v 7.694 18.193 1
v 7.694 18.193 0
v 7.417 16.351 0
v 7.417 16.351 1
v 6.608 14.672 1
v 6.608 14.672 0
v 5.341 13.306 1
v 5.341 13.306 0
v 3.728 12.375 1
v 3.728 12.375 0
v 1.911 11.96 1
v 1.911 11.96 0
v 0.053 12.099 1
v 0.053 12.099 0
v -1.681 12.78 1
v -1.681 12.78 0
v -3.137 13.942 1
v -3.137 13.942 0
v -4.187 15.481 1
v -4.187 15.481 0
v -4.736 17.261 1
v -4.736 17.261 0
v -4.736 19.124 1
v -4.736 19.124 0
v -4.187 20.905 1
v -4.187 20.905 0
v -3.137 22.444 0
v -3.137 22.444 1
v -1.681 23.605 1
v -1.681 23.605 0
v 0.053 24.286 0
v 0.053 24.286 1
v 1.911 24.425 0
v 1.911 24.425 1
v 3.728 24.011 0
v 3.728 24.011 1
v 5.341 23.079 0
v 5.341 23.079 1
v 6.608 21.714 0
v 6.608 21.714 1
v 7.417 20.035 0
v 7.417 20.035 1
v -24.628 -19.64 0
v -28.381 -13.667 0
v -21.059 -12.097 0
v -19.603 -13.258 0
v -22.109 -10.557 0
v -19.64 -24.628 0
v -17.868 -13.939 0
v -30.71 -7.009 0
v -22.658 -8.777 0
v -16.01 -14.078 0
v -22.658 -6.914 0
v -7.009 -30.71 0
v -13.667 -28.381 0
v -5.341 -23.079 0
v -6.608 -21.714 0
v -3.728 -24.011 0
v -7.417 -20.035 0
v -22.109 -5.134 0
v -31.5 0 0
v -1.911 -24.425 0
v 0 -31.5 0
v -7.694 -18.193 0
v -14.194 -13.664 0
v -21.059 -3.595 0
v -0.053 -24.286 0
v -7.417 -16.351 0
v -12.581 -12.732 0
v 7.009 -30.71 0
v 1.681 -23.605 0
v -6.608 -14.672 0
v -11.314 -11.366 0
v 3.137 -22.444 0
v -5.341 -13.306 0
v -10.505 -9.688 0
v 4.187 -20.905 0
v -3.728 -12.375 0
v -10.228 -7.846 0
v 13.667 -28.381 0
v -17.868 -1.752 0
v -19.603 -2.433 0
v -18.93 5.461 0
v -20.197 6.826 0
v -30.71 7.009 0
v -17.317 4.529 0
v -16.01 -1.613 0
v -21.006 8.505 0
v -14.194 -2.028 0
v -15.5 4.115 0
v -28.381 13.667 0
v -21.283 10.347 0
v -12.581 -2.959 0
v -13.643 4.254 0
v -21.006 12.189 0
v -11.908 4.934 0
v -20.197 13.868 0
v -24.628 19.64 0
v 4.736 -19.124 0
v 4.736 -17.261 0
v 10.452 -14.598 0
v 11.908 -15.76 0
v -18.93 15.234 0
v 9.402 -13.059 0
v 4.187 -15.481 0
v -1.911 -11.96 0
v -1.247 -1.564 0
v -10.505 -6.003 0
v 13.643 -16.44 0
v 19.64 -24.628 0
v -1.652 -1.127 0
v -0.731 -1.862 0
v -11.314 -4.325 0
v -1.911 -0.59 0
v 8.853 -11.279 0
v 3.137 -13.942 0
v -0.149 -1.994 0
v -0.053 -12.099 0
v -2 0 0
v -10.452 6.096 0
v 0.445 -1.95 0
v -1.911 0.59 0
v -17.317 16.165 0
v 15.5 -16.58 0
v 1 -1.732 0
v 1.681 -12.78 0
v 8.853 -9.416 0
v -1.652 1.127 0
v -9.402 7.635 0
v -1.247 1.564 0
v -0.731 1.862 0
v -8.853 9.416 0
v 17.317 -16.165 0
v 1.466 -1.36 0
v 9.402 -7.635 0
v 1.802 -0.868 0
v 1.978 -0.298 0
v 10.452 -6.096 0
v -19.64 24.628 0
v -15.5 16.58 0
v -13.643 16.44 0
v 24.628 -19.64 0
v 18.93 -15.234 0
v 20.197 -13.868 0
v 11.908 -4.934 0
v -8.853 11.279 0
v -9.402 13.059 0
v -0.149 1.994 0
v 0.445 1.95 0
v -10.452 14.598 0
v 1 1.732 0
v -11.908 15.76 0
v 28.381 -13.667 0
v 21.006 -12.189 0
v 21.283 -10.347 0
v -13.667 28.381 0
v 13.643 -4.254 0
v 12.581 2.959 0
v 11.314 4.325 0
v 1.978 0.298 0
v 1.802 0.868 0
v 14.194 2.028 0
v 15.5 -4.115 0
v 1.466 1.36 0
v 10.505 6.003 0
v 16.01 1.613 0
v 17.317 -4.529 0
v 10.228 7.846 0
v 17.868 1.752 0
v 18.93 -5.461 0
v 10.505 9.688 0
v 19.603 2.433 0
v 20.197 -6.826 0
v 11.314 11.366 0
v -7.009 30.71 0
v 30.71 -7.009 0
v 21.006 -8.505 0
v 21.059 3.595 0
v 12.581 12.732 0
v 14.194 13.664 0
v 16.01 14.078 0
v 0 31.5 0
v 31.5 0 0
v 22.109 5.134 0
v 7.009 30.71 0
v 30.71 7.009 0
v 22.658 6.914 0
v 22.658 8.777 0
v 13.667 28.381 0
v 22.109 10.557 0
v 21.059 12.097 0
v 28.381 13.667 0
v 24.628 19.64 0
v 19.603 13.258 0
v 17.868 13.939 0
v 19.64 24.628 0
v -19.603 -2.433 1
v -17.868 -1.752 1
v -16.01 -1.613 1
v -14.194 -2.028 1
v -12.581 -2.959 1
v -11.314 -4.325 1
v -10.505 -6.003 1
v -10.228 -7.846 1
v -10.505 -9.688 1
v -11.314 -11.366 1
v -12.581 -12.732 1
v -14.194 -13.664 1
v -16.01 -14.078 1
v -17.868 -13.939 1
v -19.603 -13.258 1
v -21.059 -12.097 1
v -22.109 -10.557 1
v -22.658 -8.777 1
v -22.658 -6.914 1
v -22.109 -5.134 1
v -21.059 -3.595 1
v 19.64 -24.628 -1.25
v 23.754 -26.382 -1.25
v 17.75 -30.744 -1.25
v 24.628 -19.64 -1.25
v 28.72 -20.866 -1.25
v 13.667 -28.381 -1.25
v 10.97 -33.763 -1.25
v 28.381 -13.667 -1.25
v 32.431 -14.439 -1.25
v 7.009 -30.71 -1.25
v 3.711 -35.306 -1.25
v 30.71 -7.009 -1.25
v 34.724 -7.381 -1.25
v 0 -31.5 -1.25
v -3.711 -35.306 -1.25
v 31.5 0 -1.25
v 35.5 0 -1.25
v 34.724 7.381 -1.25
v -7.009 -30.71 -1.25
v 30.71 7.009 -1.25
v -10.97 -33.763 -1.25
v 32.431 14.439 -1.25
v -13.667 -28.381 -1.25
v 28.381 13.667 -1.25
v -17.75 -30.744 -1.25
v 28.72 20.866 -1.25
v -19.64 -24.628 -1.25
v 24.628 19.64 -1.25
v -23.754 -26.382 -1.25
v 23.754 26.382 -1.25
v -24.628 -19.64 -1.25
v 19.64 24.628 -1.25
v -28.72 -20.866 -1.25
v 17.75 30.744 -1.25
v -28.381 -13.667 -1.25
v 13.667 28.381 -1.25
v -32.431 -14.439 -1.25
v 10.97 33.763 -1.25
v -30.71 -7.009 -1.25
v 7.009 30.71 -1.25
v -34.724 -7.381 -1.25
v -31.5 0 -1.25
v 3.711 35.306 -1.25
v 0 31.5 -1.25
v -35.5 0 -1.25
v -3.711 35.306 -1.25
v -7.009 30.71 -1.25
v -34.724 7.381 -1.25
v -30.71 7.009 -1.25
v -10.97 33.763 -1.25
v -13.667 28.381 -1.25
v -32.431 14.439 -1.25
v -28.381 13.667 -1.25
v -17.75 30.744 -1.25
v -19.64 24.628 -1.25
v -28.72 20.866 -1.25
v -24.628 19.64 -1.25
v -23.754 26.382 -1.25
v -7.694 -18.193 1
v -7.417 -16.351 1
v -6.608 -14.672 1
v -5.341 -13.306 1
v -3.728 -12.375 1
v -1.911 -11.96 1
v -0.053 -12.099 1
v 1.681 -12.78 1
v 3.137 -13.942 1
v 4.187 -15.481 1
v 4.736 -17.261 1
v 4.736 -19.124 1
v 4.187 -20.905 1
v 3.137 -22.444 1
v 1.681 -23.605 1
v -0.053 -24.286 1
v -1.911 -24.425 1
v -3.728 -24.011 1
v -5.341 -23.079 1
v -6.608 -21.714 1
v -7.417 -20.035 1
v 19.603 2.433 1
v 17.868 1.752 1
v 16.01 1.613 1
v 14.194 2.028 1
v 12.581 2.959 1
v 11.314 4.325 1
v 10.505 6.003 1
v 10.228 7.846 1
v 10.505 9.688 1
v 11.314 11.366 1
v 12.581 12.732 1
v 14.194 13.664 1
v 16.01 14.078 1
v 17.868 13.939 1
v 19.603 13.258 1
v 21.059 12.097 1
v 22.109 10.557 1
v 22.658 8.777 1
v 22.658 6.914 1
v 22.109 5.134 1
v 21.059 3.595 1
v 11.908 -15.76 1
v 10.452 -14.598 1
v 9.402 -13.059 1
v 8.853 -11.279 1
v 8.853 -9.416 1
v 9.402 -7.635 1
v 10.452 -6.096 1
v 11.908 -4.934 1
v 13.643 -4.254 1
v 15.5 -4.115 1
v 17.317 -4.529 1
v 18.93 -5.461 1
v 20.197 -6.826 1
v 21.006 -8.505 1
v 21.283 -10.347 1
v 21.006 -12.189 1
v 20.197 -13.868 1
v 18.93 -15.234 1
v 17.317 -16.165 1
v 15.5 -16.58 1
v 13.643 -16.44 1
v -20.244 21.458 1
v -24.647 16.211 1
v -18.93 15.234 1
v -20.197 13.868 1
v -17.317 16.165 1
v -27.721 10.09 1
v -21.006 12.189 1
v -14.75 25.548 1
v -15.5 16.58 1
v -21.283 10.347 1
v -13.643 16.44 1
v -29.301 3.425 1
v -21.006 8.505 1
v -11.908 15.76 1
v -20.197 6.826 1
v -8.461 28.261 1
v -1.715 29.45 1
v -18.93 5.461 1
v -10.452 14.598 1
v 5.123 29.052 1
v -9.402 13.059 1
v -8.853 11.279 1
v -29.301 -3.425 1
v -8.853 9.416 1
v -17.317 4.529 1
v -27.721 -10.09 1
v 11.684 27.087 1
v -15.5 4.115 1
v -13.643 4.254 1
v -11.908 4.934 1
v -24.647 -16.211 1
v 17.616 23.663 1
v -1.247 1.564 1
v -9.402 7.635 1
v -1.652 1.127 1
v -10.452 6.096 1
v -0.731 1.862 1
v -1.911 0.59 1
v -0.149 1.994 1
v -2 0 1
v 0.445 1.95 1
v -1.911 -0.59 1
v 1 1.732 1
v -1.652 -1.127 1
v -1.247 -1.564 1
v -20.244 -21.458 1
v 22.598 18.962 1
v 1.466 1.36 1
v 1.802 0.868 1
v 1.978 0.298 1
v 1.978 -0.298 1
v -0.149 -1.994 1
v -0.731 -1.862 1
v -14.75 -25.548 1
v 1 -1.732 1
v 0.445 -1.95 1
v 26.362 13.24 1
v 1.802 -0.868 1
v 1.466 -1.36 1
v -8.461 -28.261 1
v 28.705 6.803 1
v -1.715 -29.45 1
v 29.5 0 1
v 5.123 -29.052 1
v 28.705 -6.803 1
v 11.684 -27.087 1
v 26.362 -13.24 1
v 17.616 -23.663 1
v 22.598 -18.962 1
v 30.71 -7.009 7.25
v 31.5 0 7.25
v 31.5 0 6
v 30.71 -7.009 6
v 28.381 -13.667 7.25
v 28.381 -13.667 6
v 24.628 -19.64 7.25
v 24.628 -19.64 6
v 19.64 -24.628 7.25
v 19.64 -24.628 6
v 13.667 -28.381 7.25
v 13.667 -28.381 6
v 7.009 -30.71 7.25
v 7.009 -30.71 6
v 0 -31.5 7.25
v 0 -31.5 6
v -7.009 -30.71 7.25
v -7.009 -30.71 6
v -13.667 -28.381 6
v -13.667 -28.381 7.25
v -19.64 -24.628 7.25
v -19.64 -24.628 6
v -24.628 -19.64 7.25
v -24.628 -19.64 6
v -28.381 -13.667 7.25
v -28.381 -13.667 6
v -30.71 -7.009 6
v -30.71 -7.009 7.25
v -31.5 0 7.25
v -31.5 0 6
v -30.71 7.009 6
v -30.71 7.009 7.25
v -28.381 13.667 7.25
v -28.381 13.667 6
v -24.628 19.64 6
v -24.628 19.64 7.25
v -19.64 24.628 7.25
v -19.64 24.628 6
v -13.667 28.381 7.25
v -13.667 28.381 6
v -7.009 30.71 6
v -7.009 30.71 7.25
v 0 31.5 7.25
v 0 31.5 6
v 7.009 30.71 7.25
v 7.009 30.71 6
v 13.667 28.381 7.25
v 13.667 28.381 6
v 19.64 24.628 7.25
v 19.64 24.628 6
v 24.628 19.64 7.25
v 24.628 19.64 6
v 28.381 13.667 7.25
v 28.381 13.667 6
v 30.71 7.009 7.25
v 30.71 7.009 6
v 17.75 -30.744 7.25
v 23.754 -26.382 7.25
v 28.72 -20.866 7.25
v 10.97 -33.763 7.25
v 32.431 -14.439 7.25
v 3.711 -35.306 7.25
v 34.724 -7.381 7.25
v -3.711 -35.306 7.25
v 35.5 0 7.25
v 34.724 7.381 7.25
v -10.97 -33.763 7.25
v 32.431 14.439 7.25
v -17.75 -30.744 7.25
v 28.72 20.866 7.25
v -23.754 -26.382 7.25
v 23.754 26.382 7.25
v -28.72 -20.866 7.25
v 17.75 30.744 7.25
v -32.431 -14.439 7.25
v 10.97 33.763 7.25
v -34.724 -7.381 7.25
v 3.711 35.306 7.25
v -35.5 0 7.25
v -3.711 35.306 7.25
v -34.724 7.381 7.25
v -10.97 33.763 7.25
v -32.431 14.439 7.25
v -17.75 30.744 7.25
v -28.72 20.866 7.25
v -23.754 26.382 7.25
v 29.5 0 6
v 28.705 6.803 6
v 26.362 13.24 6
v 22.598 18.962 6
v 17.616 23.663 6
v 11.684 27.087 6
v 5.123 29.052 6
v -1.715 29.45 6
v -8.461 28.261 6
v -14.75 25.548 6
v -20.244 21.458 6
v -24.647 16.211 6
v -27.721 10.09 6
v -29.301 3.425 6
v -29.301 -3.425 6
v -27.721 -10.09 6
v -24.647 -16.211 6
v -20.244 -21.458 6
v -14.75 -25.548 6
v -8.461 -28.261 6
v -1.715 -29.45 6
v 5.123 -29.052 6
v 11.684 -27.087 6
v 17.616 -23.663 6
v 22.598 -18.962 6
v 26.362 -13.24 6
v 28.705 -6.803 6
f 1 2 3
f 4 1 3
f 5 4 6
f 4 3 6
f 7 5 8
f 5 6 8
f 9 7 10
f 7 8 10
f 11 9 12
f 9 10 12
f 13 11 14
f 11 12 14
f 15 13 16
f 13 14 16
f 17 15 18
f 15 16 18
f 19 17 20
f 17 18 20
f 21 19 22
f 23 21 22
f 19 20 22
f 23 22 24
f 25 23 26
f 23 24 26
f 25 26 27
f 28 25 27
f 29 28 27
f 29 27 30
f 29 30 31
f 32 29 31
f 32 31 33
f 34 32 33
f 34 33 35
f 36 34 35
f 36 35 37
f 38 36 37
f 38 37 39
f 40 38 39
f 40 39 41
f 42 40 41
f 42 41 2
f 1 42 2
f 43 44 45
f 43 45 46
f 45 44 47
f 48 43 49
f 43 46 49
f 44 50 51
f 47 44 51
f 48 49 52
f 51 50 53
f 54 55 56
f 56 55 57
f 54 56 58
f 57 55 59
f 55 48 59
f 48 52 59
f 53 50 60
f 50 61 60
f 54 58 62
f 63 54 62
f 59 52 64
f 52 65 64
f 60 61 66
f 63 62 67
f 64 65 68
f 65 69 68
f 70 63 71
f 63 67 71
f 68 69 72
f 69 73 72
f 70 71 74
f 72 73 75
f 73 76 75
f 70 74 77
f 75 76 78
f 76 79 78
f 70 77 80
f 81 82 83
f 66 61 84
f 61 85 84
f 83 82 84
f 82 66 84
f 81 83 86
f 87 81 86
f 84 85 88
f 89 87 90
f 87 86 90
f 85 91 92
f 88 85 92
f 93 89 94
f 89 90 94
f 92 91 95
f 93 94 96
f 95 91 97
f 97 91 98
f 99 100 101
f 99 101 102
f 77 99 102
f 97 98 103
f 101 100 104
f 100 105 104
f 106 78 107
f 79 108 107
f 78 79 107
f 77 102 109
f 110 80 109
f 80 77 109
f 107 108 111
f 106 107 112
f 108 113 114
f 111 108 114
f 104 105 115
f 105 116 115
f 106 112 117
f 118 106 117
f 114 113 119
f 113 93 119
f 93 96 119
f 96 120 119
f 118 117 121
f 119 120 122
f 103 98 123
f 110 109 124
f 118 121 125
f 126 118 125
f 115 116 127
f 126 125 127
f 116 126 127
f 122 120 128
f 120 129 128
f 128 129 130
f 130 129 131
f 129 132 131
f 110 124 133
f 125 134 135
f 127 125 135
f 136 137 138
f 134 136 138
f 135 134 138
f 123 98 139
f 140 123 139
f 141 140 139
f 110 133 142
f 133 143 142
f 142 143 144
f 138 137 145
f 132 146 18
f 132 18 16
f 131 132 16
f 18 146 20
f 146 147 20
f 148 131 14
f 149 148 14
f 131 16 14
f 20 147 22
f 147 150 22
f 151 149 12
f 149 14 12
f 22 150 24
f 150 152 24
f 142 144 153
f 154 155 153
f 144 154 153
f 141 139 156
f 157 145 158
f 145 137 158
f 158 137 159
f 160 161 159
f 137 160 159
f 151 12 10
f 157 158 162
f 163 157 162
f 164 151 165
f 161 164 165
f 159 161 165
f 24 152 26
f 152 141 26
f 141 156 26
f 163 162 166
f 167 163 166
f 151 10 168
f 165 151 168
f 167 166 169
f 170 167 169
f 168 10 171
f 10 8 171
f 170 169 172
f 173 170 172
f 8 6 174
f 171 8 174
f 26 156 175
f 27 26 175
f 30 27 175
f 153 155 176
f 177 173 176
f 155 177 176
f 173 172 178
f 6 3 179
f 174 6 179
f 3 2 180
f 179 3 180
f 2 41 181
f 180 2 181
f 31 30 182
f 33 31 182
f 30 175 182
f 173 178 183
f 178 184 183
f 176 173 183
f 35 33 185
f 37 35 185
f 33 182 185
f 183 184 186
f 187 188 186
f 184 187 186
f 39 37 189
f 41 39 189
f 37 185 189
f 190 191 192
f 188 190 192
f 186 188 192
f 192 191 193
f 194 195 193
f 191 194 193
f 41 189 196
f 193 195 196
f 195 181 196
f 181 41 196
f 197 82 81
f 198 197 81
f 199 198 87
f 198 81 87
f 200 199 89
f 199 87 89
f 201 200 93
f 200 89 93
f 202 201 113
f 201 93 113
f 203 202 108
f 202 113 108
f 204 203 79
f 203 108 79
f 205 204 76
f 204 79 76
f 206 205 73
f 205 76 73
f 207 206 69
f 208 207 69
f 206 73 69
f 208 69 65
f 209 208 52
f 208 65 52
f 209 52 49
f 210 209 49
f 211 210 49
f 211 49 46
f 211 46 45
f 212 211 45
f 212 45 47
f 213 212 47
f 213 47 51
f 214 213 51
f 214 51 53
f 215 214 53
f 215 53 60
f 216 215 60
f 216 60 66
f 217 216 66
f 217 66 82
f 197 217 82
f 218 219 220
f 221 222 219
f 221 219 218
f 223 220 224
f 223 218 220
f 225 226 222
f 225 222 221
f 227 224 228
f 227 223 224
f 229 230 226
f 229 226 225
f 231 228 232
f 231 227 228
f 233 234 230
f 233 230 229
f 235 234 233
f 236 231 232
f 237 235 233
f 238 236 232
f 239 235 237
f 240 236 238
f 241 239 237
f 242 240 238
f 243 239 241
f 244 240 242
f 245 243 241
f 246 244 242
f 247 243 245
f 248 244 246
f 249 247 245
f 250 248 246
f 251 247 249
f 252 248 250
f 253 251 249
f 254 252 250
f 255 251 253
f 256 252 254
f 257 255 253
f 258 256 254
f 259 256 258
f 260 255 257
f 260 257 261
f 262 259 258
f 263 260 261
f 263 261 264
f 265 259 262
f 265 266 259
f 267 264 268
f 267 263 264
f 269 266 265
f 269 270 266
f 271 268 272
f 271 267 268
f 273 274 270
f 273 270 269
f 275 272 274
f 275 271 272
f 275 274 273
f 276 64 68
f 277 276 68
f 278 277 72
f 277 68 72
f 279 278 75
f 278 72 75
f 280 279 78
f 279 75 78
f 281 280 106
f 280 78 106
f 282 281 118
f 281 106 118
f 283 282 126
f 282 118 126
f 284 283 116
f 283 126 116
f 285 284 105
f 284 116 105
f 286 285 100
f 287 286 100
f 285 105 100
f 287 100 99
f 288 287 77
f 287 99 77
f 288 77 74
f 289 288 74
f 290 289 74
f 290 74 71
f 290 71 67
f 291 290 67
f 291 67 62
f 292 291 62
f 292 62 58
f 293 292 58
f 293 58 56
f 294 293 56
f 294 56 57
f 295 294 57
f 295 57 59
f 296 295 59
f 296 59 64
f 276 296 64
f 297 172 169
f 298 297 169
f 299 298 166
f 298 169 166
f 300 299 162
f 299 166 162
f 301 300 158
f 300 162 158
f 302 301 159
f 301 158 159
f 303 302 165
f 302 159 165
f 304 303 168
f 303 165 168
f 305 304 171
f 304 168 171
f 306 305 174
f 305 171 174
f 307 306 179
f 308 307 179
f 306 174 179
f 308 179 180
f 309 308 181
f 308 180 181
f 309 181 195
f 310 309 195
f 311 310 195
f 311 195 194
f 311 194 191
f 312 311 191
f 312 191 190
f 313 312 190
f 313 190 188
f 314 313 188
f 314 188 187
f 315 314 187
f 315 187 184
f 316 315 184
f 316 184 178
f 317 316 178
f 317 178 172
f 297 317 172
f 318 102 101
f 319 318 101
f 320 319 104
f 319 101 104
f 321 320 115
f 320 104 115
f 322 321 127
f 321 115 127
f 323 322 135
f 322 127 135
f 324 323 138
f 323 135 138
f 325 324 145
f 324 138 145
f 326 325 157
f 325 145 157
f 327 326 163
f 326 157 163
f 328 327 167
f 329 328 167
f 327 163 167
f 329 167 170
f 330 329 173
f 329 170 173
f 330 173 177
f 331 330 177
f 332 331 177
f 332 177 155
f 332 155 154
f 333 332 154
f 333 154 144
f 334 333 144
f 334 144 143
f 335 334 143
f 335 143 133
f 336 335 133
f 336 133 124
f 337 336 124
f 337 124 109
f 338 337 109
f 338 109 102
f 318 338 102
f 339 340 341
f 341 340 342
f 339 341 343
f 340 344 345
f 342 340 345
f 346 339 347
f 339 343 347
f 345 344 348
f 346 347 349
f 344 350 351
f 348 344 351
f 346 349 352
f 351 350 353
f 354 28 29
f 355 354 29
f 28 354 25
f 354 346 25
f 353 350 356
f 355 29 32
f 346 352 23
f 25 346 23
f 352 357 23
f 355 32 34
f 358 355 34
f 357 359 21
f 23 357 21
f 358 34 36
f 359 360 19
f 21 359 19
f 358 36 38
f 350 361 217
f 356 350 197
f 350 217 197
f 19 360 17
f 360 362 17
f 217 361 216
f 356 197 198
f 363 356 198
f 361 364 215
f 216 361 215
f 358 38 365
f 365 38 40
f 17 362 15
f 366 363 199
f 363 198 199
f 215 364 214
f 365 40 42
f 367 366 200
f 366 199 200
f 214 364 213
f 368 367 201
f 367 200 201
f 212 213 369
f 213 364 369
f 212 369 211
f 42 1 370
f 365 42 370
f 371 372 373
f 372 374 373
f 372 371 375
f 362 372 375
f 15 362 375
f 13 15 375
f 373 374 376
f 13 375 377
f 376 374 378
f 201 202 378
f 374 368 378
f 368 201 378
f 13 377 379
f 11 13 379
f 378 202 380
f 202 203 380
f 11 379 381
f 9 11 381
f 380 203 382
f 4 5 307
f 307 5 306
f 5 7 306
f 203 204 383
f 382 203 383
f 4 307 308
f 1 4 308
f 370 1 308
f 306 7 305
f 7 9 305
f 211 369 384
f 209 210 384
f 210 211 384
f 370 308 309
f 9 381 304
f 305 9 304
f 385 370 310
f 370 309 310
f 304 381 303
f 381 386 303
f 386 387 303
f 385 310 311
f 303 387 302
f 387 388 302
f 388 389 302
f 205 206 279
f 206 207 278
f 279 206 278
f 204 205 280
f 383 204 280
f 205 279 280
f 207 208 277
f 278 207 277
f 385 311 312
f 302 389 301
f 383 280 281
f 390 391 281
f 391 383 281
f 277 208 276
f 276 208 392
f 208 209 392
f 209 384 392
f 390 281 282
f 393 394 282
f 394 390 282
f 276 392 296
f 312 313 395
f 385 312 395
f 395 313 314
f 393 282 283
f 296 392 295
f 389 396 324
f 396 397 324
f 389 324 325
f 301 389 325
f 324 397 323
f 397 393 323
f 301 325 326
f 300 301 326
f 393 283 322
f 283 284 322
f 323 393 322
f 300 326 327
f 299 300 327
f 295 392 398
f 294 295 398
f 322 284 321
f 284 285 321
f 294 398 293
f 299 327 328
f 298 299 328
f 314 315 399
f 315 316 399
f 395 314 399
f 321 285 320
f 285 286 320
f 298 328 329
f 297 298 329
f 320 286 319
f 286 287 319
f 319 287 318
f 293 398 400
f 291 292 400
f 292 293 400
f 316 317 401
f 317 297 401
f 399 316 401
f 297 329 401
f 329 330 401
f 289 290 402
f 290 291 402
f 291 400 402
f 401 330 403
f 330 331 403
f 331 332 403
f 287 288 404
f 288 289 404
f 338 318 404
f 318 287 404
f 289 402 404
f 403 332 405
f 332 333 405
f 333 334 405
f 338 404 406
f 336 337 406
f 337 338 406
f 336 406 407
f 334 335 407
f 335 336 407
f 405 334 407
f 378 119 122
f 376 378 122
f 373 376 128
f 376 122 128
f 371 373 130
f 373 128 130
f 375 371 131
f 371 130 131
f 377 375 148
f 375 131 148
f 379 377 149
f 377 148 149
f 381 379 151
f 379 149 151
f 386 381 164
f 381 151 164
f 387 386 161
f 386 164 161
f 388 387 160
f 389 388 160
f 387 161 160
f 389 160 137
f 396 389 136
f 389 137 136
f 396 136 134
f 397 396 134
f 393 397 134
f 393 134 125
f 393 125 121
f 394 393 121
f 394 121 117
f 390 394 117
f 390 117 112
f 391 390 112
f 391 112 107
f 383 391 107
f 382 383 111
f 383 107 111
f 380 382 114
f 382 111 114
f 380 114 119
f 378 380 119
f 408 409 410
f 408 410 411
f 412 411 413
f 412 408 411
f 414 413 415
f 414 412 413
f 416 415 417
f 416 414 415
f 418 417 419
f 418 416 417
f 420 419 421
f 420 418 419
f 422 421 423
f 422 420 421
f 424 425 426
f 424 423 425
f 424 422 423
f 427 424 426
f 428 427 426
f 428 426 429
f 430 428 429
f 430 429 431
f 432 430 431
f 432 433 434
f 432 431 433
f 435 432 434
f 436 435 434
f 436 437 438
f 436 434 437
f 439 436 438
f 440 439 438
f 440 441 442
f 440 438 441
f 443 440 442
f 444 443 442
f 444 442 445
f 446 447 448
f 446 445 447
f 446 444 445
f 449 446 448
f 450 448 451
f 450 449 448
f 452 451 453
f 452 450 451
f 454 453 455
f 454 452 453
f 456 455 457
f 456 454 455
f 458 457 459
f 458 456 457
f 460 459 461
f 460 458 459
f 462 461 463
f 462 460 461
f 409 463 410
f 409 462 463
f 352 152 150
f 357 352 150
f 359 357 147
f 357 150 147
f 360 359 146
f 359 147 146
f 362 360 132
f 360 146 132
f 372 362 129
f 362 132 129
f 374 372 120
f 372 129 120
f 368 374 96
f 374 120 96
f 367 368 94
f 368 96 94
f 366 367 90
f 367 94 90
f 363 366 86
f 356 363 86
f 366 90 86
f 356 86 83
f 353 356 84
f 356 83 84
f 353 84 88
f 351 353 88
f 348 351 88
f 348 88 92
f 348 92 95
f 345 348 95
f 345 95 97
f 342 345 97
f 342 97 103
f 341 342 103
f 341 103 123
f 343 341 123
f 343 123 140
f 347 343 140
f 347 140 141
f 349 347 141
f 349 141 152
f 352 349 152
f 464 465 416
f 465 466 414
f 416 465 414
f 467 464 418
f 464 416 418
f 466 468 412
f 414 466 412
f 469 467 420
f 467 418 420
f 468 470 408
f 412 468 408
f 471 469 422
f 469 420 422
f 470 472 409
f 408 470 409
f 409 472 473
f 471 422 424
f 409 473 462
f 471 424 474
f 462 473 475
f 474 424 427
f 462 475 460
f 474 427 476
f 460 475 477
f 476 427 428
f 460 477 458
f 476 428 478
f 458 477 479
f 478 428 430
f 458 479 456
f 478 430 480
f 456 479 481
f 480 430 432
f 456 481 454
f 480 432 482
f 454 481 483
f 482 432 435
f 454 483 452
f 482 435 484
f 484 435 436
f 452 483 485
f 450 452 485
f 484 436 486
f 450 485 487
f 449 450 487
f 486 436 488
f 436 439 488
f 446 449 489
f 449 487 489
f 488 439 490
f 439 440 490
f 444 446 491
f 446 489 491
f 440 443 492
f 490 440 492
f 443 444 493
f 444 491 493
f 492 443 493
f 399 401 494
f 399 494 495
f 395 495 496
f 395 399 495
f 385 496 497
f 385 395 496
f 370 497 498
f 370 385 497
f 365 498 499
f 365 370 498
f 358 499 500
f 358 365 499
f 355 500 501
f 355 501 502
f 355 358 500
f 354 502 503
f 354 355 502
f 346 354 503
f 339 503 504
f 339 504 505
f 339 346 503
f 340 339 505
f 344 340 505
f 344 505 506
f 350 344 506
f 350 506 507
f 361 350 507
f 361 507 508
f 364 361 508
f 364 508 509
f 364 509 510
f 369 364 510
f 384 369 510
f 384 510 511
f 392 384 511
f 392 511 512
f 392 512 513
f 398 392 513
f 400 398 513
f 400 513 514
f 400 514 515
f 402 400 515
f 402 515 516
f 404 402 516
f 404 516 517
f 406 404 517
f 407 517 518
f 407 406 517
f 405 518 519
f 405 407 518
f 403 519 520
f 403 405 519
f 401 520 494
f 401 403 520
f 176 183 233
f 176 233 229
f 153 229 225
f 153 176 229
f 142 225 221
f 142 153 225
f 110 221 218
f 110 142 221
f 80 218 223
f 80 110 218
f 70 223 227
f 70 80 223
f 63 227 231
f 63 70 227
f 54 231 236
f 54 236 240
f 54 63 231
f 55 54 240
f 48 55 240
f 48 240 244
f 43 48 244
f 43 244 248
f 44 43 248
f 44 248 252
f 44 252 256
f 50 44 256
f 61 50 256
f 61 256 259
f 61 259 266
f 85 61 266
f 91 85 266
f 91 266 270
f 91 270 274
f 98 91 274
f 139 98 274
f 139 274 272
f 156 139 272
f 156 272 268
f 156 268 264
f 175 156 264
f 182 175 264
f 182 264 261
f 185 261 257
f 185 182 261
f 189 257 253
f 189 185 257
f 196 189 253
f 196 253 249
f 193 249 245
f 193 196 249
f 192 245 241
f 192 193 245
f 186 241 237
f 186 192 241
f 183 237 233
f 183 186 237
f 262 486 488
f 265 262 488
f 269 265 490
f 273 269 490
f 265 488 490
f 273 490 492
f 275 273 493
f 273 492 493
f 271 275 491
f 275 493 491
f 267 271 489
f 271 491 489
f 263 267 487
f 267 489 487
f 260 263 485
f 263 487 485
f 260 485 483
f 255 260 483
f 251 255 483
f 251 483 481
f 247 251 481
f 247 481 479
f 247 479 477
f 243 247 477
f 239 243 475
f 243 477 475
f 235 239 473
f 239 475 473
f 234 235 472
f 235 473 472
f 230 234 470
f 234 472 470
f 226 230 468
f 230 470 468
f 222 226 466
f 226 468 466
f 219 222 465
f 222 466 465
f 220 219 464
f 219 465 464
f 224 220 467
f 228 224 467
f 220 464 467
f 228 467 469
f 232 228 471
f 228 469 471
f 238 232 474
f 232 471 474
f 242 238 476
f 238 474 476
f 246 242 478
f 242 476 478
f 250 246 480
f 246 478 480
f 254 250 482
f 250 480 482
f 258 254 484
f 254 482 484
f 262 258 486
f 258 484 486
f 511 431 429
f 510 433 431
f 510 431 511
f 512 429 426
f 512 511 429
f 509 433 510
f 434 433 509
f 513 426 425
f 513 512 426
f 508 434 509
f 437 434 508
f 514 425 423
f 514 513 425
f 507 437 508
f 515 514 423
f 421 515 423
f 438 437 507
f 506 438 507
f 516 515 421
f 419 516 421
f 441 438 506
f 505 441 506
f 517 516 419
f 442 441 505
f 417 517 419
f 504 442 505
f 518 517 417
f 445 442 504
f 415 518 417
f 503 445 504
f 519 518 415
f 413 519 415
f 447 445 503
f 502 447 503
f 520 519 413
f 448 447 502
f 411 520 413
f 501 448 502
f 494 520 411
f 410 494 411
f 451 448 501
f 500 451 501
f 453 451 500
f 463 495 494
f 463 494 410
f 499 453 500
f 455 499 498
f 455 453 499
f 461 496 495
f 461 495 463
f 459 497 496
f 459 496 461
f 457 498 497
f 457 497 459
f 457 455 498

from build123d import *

# Parameters (mm, degrees)
SKETCH1_R                = 33
SKETCH1_R_2              = 29.5
BOSS_EXTRUDE1_DEPTH      = 6
SKETCH2_R                = 33
SKETCH2_R_2              = 2
BOSS_EXTRUDE2_DEPTH      = 1
SKETCH3_R                = 6.25
CUT_EXTRUDE2_DEPTH       = 7
CIRPATTERN1_COUNT        = 6
BOSS_EXTRUDE3_DEPTH      = 1.25
BOSS_EXTRUDE3_DEPTH_BACK = 7.25
SKETCH4_R                = 35.5
SKETCH4_R_2              = 31.5


with BuildPart() as part:
    # Sketch1 → Boss-Extrude1 (new body)
    with BuildSketch(Plane.XY):
        Circle(SKETCH1_R)
        Circle(SKETCH1_R_2, mode=Mode.SUBTRACT)
    extrude(amount=BOSS_EXTRUDE1_DEPTH)

    # Sketch2 → Boss-Extrude2 (add)
    with BuildSketch(Plane(origin=(0, 0, 0), x_dir=(-1, 0, 0), z_dir=(0, 0, -1))):
        with Locations(Location((0, 0, 0), (0, 0, 180))):
            Circle(SKETCH2_R)
        Circle(SKETCH2_R_2, mode=Mode.SUBTRACT)
    extrude(amount=-BOSS_EXTRUDE2_DEPTH)

    # Sketch3 → Cut-Extrude2 (cut)
    with BuildSketch(Plane(origin=(0, 0, 0), x_dir=(-1, 0, 0), z_dir=(0, 0, -1))):
        with Locations((1.444237573, -18.192764436)):
            Circle(SKETCH3_R)
    cut_extrude2 = extrude(amount=-CUT_EXTRUDE2_DEPTH, mode=Mode.SUBTRACT)

    # CirPattern1: Cut-Extrude2 ×6 about axis
    cirpattern1_axis = Axis((0, 0, 0), (0, 0, 1))
    for i in range(1, CIRPATTERN1_COUNT):
        add(cut_extrude2.rotate(cirpattern1_axis, i * 360 / CIRPATTERN1_COUNT), mode=Mode.SUBTRACT)

    # Sketch4 → Boss-Extrude3 (add, two sides: drawn at the far end of the back side and taken through both)
    with BuildSketch(Plane(origin=(0, 0, 0), x_dir=(-1, 0, 0), z_dir=(0, 0, -1)).offset(-BOSS_EXTRUDE3_DEPTH_BACK)):
        Circle(SKETCH4_R)
        with Locations(Location((0, 0, 0), (0, 0, 180))):
            Circle(SKETCH4_R_2, mode=Mode.SUBTRACT)
    extrude(amount=BOSS_EXTRUDE3_DEPTH + BOSS_EXTRUDE3_DEPTH_BACK)


solid = part.part
